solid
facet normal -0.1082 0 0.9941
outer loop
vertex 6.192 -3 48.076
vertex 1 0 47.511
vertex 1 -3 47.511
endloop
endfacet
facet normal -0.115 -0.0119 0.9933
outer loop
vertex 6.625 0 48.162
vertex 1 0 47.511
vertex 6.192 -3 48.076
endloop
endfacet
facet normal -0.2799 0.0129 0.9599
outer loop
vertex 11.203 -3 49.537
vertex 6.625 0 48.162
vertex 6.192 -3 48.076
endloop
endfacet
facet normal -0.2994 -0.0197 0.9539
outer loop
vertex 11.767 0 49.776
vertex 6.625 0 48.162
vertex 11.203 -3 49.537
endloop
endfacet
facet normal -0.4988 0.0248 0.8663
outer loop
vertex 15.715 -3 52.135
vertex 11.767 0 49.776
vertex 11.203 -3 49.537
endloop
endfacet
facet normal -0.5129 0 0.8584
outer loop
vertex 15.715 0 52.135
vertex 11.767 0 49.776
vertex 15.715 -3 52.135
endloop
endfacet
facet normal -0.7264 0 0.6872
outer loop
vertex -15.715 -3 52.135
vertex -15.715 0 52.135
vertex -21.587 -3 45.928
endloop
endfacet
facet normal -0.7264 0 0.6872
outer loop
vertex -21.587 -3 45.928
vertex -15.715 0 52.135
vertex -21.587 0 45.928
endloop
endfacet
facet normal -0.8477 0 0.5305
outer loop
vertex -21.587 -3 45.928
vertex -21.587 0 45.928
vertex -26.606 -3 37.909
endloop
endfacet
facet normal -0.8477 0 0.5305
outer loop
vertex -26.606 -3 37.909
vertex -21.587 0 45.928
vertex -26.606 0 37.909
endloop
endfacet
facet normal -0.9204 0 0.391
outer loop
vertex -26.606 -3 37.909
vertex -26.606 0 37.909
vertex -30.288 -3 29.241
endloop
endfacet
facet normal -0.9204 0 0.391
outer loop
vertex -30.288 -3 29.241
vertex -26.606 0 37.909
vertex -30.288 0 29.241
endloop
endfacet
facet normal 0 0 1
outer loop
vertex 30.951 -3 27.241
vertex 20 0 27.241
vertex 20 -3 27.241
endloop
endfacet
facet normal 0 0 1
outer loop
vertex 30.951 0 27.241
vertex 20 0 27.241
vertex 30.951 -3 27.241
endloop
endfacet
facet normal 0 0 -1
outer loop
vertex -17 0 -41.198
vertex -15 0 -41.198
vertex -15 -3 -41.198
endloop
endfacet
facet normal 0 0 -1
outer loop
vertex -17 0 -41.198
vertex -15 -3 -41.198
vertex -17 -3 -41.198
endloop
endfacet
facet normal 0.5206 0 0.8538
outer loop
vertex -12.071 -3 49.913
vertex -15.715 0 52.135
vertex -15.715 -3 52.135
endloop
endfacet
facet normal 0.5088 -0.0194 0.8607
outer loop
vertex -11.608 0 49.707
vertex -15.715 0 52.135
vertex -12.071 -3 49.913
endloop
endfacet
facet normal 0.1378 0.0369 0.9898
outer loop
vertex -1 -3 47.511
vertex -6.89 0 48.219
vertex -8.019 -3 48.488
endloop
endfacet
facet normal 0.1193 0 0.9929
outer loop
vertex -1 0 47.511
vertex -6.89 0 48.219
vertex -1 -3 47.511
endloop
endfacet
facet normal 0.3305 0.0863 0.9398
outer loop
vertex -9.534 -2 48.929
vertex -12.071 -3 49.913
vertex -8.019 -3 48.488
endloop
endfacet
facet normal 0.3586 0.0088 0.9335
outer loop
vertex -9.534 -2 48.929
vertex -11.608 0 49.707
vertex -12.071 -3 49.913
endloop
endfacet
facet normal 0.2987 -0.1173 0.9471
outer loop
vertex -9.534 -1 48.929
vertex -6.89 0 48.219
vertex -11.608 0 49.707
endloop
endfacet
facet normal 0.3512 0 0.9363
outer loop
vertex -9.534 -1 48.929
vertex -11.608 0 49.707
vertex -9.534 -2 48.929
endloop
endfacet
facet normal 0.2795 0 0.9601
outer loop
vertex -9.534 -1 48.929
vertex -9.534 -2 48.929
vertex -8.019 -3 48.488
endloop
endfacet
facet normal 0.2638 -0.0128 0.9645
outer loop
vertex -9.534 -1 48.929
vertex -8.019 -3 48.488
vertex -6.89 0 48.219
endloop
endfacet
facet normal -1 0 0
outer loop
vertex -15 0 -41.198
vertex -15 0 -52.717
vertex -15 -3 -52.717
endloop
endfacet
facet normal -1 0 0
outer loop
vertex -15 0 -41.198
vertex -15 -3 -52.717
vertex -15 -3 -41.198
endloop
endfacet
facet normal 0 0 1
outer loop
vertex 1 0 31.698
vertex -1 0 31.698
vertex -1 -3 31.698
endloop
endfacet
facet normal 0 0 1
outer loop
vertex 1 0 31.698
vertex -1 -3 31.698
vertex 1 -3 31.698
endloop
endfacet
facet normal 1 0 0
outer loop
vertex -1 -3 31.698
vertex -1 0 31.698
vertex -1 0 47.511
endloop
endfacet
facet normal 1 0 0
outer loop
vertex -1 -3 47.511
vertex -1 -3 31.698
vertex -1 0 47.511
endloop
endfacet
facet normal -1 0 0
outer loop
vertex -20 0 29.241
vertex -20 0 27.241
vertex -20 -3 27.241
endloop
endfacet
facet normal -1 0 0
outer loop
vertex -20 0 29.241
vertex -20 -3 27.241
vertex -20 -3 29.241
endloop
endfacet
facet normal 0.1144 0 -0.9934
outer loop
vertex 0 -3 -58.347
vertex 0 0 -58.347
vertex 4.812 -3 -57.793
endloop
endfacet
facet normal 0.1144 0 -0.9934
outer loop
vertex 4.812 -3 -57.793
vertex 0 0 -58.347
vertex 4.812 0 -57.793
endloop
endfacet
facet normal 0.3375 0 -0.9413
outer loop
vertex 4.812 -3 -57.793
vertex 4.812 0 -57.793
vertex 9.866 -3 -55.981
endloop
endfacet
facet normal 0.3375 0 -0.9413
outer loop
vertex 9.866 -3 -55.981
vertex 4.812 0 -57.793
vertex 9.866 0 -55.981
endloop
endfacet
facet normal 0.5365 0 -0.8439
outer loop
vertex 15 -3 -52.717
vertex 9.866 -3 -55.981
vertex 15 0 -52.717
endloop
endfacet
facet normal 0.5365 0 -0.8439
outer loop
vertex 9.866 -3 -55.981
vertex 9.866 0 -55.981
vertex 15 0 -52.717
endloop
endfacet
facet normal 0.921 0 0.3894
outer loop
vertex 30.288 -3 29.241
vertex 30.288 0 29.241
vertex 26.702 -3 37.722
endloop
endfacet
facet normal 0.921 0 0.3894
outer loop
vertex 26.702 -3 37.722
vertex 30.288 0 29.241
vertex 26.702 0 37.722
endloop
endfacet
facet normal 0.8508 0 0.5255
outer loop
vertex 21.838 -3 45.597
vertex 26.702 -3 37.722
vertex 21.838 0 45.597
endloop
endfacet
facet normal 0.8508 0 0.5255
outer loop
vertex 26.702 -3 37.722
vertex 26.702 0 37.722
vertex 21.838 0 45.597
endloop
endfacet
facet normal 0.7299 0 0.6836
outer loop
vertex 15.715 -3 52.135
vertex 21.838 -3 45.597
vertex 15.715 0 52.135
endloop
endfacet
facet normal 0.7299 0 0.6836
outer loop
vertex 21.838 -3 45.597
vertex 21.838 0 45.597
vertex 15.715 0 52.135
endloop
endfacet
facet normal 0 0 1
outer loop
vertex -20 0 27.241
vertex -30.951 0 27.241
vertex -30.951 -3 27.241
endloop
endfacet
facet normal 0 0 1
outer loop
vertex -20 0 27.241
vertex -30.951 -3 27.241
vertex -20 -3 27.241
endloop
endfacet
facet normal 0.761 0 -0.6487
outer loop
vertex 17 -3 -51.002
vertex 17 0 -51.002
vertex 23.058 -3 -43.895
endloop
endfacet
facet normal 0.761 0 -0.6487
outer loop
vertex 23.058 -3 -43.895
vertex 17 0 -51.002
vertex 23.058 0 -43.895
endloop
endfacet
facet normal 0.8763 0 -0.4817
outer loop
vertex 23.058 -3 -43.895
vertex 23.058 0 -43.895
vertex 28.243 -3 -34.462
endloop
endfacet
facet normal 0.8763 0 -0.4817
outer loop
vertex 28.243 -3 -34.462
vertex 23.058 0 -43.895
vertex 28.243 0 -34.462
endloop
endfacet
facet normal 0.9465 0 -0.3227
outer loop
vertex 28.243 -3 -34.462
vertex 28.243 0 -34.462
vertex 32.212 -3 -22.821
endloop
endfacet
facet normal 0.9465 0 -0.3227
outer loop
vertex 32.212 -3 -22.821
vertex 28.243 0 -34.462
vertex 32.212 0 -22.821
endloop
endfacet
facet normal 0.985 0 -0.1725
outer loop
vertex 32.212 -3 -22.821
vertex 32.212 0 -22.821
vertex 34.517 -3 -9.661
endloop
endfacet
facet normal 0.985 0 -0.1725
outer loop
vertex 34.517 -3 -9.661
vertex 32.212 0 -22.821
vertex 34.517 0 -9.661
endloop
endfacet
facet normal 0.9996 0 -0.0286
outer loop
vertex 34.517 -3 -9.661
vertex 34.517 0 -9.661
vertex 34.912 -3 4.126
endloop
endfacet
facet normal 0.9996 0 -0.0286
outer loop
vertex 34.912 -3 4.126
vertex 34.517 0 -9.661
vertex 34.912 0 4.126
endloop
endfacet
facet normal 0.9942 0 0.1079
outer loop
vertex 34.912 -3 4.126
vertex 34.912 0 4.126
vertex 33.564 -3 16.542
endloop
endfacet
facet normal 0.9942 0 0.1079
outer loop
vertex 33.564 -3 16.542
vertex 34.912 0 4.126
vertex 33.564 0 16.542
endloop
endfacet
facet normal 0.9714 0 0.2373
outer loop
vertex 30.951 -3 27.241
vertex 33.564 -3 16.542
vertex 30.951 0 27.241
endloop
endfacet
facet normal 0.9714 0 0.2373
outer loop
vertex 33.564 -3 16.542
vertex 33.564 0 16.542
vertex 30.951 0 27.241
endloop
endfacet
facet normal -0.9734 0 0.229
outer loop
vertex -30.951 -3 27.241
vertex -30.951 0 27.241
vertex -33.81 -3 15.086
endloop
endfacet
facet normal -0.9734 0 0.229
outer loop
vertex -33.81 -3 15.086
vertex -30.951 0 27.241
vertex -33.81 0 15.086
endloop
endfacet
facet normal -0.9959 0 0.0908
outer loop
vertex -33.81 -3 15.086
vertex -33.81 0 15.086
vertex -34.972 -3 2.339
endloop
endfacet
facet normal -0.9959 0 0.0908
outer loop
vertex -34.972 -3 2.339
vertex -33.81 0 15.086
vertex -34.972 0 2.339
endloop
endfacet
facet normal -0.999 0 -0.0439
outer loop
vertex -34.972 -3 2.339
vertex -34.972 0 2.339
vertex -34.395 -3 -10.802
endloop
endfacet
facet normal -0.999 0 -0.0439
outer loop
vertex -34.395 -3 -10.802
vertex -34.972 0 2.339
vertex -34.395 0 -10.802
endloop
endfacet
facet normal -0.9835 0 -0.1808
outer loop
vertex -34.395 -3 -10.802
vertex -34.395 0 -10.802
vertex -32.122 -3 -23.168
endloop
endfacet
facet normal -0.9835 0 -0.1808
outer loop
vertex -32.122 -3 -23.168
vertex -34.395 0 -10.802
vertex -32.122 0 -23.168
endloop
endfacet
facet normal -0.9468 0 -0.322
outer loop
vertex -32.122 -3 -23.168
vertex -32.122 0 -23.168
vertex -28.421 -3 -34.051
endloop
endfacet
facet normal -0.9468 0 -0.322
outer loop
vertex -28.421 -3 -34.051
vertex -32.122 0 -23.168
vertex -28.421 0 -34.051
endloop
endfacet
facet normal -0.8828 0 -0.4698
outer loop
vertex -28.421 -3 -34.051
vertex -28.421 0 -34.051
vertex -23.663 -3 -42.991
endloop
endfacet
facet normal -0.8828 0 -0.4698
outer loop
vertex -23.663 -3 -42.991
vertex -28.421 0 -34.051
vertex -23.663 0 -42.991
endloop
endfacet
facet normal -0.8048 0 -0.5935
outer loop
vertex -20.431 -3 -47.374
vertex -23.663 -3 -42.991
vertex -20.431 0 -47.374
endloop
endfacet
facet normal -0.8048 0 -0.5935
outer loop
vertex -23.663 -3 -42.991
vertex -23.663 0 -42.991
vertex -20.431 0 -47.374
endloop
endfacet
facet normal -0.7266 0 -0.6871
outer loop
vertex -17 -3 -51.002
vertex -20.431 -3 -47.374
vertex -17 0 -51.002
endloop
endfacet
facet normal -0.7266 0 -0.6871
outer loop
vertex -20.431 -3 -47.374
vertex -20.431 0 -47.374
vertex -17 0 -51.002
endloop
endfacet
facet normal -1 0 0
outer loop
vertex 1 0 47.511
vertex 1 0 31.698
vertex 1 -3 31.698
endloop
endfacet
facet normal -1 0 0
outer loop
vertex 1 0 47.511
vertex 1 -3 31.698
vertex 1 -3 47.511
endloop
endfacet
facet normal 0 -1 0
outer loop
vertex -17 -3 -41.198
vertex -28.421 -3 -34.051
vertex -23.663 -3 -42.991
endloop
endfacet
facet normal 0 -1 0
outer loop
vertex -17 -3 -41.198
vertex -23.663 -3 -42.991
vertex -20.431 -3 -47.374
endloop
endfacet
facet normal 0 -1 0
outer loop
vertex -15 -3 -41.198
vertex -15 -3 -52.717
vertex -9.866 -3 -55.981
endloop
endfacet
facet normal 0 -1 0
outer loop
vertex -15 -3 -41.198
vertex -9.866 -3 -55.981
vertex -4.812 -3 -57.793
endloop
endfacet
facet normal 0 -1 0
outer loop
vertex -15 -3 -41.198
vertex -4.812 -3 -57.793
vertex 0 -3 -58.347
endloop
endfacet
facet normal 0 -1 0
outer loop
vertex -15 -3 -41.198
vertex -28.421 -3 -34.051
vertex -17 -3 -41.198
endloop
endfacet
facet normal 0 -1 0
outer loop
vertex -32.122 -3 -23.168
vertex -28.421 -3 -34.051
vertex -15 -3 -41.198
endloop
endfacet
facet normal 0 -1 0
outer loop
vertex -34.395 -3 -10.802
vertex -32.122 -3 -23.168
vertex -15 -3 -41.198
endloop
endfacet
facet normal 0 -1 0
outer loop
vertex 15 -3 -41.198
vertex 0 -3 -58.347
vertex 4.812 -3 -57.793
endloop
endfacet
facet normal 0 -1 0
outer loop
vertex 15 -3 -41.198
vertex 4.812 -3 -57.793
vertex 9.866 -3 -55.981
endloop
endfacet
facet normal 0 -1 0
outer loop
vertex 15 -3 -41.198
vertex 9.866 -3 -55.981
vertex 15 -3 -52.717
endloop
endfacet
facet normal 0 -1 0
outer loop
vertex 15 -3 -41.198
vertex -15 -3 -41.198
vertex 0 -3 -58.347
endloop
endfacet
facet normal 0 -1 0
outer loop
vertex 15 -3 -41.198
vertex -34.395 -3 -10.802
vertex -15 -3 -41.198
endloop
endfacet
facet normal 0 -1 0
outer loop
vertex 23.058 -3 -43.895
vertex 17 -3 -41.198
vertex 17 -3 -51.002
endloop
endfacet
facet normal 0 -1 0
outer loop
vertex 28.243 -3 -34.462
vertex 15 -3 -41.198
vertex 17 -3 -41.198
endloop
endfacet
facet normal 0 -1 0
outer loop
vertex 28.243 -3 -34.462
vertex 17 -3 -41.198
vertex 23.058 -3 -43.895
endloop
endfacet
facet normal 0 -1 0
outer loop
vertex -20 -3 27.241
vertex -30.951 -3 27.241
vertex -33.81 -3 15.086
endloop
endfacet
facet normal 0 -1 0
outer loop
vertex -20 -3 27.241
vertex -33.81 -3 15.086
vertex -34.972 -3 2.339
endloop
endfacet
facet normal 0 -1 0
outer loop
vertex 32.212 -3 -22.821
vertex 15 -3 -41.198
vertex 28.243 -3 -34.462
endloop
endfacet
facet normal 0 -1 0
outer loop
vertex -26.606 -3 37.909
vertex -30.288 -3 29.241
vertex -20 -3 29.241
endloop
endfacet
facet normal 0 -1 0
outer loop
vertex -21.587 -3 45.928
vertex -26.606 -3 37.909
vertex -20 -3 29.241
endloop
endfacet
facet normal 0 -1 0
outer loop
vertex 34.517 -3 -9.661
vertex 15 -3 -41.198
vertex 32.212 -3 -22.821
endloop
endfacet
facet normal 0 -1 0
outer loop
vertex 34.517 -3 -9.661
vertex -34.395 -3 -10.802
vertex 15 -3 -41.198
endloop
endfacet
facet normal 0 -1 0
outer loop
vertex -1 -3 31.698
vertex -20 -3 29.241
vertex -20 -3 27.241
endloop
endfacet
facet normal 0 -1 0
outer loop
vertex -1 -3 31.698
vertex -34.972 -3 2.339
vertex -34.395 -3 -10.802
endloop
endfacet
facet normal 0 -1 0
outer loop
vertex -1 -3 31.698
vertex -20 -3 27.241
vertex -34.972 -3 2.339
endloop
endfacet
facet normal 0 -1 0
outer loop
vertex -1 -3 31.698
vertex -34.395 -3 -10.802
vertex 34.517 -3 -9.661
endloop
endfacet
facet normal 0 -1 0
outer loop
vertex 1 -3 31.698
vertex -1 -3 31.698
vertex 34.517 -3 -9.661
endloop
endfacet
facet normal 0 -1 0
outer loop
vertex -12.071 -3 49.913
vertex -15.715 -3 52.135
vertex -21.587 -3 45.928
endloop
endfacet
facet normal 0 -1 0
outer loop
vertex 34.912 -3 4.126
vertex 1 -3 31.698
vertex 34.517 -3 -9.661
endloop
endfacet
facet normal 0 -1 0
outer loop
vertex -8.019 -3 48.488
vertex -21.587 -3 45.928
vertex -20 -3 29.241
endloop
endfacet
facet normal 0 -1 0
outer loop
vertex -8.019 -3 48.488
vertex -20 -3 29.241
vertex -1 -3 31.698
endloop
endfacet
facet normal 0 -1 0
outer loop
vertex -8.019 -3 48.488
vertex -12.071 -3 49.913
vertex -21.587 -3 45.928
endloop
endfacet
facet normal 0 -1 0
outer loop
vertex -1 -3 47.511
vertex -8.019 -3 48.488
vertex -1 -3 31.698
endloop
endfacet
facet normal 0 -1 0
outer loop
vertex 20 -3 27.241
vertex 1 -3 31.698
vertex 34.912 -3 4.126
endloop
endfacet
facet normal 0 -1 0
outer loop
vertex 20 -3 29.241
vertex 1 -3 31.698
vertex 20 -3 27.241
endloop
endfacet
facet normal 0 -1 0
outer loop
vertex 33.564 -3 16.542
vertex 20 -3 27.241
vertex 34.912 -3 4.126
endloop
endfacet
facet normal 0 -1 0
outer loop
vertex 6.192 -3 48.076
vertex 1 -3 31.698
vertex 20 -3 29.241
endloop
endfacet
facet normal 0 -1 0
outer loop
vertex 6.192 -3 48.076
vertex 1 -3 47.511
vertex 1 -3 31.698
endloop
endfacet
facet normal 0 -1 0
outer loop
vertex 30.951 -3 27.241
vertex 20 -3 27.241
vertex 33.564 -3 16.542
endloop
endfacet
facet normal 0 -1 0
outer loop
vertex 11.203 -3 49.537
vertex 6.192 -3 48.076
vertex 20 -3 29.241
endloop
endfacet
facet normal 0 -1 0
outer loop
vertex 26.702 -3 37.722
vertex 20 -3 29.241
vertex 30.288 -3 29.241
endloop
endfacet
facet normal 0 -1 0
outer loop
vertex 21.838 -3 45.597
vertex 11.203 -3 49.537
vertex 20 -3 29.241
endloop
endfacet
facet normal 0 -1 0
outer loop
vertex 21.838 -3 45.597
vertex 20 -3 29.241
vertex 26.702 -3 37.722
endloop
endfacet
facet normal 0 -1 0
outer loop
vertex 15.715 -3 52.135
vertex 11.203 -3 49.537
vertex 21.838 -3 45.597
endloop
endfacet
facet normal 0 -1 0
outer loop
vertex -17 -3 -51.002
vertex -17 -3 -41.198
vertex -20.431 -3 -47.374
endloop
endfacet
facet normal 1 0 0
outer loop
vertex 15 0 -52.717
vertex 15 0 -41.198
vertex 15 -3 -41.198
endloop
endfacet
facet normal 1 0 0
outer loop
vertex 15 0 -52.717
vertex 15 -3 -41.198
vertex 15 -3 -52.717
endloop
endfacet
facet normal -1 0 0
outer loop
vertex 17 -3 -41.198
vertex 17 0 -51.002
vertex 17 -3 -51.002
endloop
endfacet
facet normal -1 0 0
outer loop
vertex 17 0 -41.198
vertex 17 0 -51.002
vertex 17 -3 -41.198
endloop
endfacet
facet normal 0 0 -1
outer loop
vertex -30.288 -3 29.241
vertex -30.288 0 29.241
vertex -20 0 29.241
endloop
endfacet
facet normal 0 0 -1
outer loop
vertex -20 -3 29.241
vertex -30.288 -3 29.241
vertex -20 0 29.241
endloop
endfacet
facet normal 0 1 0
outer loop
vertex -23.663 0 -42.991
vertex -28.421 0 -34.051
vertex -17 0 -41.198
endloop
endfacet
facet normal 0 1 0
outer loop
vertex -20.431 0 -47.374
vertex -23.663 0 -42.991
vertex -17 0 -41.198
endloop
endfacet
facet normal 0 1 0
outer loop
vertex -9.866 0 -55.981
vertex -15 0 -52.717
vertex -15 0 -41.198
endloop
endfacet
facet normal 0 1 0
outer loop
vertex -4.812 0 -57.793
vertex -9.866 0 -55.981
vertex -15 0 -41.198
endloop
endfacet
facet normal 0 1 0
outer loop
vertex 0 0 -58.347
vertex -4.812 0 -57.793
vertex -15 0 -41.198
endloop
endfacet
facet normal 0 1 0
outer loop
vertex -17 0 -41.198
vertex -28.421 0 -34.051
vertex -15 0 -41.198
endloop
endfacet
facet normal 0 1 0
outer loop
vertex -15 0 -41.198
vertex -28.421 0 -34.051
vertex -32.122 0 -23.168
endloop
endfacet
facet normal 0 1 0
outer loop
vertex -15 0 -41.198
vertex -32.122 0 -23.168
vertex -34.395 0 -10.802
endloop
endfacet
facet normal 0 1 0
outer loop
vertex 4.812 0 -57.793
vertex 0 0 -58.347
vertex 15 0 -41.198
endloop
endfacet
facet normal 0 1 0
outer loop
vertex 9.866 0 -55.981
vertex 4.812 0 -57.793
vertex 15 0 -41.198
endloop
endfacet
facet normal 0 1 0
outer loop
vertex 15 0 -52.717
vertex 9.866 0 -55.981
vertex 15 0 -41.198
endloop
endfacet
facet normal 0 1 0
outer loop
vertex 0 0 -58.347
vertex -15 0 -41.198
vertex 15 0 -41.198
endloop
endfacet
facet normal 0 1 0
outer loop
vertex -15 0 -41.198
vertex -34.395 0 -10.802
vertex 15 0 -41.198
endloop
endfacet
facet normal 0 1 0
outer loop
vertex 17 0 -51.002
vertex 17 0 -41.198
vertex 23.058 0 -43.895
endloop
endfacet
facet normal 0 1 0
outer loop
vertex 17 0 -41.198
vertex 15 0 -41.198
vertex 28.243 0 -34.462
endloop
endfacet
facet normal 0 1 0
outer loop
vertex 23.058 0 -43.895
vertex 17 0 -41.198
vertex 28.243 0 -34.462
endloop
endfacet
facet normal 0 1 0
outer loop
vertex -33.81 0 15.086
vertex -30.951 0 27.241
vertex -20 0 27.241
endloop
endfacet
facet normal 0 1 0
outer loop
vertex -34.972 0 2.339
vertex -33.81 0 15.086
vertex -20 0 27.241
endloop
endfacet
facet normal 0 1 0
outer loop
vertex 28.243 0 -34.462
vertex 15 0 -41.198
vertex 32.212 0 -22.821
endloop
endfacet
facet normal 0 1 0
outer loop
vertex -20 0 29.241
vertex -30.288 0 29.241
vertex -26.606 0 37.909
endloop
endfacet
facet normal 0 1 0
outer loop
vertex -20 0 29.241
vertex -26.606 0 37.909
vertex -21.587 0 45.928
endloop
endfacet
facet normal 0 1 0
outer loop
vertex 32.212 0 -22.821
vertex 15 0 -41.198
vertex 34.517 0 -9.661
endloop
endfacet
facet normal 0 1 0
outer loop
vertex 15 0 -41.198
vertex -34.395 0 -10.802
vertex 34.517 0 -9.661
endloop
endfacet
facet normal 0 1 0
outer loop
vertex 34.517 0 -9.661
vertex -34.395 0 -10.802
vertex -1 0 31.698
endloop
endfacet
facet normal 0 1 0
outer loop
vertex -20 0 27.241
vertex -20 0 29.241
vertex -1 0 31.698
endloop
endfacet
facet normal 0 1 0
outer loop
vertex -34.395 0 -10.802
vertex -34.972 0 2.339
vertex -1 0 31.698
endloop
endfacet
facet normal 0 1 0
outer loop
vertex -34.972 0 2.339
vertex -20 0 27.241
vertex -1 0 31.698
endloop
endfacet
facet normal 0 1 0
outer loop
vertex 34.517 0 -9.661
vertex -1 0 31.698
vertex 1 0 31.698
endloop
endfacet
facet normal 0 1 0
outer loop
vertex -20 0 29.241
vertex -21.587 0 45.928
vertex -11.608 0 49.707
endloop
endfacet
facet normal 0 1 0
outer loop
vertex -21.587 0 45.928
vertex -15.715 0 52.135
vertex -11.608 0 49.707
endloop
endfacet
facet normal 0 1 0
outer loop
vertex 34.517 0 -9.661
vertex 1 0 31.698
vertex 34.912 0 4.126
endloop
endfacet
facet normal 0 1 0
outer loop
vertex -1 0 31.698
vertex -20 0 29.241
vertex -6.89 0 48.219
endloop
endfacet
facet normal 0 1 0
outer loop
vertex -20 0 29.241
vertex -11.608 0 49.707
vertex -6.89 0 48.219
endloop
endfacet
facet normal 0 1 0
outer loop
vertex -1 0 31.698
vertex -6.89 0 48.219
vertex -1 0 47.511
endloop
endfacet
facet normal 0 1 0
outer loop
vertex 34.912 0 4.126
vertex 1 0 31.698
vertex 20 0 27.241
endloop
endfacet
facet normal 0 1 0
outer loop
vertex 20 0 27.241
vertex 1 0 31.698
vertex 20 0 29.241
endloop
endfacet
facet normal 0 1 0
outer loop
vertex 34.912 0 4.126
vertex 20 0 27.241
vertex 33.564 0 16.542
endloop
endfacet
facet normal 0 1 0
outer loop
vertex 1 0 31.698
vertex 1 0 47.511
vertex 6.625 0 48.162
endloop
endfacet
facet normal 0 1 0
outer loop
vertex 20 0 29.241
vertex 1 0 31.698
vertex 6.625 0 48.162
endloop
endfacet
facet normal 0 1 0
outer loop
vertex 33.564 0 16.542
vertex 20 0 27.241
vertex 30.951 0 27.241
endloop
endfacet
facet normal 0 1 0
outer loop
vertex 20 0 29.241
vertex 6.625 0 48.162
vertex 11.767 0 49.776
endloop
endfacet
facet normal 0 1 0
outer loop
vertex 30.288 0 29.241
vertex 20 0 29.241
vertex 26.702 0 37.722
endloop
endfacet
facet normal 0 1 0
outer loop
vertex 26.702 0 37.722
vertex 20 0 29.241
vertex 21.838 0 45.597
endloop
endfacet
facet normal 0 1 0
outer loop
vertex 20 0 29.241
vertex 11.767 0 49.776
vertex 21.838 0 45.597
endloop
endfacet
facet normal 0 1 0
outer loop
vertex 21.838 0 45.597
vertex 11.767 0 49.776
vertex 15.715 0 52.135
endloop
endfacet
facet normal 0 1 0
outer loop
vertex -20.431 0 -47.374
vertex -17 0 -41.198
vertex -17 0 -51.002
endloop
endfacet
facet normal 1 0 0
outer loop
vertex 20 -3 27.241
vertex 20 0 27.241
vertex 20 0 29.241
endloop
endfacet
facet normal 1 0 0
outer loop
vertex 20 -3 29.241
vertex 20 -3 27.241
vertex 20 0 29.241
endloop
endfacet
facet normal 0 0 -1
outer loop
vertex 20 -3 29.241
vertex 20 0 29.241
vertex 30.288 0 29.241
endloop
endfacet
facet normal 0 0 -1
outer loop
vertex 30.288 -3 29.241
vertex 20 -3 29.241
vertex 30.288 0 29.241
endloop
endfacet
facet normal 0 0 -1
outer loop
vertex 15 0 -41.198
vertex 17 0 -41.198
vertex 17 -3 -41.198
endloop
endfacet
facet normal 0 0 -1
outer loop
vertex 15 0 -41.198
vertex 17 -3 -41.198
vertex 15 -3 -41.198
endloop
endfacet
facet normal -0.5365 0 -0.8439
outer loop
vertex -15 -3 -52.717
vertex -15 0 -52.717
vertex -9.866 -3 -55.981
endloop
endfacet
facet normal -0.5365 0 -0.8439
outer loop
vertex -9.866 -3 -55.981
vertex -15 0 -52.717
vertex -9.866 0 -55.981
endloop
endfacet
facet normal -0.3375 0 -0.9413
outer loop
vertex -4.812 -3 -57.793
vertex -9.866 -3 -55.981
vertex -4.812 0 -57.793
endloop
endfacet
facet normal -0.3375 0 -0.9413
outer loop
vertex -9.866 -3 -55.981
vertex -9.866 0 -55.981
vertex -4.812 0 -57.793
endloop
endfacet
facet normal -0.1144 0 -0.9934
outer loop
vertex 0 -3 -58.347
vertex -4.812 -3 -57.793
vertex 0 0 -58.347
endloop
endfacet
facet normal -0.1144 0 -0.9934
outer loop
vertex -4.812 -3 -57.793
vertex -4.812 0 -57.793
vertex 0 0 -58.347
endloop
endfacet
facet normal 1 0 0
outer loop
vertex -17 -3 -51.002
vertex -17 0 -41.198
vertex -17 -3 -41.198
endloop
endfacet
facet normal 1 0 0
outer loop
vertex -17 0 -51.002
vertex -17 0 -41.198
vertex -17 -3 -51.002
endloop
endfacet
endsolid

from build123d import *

# Parameters (mm, degrees)
F1_DEPTH = 3
F2_W     = 29.469342
F2_H     = 2
F3_DEPTH = 25
F5_DEPTH = 10
F7_DEPTH = 25
F8_W     = 1
F8_H     = 25
F9_DEPTH = 25


with BuildPart() as f1:
    # F0 (on Front) → F1 (new body)
    with BuildSketch(Plane.XZ):
        with BuildLine():
            add(Edge.make_bspline(
                [(0, -58.346872), (60.621778, -58.346872), (30.310889, 29.173436), (0, 116.693744), (-30.310889, 29.173436), (-60.621778, -58.346872), (0, -58.346872)],
                knots=[0, 0, 0, 2.094395, 2.094395, 4.18879, 4.18879, 6.283185, 6.283185, 6.283185], degree=2, weights=[1, 0.5, 1, 0.5, 1, 0.5, 1]))
        make_face()
    extrude(amount=F1_DEPTH)

    # F2 (on Front) → F3 (cut)
    with BuildSketch(Plane.XZ):
        with Locations((-34.734671, 28.240567)):
            Rectangle(F2_W, F2_H)
        with Locations((34.734671, 28.240567)):
            Rectangle(F2_W, F2_H)
    extrude(amount=F3_DEPTH, mode=Mode.SUBTRACT)

    # F4 (on Front) → F5 (cut)
    with BuildSketch(Plane.XZ):
        Polygon((-15, -41.198471), (-17, -41.198471), (-17, -51.198471), (-17, -64.541914), (-15, -64.62919), (-15, -53.12467), align=None)
        Polygon((17, -51.198471), (17, -41.198471), (15, -41.198471), (15, -53.12467), (15, -64.62919), (17, -64.62919), align=None)
    extrude(amount=F5_DEPTH, mode=Mode.SUBTRACT)

    # F6 (on Front) → F7 (cut)
    with BuildSketch(Plane.XZ):
        with BuildLine():
            add(Edge.make_bspline(
                [(19.068396, 58.195755), (19.068396, 76.728505), (-9.534198, 67.46213), (-38.136791, 58.195755), (-9.534198, 48.92938), (19.068396, 39.663005), (19.068396, 58.195755)],
                knots=[0, 0, 0, 2.094395, 2.094395, 4.18879, 4.18879, 6.283185, 6.283185, 6.283185], degree=2, weights=[1, 0.5, 1, 0.5, 1, 0.5, 1]))
        make_face()
    extrude(amount=F7_DEPTH, mode=Mode.SUBTRACT)

    # F8 (on Front) → F9 (cut)
    with BuildSketch(Plane.XZ):
        with Locations((-0.5, 44.198115)):
            Rectangle(F8_W, F8_H)
        with Locations((0.5, 44.198115)):
            Rectangle(F8_W, F8_H)
    extrude(amount=F9_DEPTH, mode=Mode.SUBTRACT)


solid = f1.part
